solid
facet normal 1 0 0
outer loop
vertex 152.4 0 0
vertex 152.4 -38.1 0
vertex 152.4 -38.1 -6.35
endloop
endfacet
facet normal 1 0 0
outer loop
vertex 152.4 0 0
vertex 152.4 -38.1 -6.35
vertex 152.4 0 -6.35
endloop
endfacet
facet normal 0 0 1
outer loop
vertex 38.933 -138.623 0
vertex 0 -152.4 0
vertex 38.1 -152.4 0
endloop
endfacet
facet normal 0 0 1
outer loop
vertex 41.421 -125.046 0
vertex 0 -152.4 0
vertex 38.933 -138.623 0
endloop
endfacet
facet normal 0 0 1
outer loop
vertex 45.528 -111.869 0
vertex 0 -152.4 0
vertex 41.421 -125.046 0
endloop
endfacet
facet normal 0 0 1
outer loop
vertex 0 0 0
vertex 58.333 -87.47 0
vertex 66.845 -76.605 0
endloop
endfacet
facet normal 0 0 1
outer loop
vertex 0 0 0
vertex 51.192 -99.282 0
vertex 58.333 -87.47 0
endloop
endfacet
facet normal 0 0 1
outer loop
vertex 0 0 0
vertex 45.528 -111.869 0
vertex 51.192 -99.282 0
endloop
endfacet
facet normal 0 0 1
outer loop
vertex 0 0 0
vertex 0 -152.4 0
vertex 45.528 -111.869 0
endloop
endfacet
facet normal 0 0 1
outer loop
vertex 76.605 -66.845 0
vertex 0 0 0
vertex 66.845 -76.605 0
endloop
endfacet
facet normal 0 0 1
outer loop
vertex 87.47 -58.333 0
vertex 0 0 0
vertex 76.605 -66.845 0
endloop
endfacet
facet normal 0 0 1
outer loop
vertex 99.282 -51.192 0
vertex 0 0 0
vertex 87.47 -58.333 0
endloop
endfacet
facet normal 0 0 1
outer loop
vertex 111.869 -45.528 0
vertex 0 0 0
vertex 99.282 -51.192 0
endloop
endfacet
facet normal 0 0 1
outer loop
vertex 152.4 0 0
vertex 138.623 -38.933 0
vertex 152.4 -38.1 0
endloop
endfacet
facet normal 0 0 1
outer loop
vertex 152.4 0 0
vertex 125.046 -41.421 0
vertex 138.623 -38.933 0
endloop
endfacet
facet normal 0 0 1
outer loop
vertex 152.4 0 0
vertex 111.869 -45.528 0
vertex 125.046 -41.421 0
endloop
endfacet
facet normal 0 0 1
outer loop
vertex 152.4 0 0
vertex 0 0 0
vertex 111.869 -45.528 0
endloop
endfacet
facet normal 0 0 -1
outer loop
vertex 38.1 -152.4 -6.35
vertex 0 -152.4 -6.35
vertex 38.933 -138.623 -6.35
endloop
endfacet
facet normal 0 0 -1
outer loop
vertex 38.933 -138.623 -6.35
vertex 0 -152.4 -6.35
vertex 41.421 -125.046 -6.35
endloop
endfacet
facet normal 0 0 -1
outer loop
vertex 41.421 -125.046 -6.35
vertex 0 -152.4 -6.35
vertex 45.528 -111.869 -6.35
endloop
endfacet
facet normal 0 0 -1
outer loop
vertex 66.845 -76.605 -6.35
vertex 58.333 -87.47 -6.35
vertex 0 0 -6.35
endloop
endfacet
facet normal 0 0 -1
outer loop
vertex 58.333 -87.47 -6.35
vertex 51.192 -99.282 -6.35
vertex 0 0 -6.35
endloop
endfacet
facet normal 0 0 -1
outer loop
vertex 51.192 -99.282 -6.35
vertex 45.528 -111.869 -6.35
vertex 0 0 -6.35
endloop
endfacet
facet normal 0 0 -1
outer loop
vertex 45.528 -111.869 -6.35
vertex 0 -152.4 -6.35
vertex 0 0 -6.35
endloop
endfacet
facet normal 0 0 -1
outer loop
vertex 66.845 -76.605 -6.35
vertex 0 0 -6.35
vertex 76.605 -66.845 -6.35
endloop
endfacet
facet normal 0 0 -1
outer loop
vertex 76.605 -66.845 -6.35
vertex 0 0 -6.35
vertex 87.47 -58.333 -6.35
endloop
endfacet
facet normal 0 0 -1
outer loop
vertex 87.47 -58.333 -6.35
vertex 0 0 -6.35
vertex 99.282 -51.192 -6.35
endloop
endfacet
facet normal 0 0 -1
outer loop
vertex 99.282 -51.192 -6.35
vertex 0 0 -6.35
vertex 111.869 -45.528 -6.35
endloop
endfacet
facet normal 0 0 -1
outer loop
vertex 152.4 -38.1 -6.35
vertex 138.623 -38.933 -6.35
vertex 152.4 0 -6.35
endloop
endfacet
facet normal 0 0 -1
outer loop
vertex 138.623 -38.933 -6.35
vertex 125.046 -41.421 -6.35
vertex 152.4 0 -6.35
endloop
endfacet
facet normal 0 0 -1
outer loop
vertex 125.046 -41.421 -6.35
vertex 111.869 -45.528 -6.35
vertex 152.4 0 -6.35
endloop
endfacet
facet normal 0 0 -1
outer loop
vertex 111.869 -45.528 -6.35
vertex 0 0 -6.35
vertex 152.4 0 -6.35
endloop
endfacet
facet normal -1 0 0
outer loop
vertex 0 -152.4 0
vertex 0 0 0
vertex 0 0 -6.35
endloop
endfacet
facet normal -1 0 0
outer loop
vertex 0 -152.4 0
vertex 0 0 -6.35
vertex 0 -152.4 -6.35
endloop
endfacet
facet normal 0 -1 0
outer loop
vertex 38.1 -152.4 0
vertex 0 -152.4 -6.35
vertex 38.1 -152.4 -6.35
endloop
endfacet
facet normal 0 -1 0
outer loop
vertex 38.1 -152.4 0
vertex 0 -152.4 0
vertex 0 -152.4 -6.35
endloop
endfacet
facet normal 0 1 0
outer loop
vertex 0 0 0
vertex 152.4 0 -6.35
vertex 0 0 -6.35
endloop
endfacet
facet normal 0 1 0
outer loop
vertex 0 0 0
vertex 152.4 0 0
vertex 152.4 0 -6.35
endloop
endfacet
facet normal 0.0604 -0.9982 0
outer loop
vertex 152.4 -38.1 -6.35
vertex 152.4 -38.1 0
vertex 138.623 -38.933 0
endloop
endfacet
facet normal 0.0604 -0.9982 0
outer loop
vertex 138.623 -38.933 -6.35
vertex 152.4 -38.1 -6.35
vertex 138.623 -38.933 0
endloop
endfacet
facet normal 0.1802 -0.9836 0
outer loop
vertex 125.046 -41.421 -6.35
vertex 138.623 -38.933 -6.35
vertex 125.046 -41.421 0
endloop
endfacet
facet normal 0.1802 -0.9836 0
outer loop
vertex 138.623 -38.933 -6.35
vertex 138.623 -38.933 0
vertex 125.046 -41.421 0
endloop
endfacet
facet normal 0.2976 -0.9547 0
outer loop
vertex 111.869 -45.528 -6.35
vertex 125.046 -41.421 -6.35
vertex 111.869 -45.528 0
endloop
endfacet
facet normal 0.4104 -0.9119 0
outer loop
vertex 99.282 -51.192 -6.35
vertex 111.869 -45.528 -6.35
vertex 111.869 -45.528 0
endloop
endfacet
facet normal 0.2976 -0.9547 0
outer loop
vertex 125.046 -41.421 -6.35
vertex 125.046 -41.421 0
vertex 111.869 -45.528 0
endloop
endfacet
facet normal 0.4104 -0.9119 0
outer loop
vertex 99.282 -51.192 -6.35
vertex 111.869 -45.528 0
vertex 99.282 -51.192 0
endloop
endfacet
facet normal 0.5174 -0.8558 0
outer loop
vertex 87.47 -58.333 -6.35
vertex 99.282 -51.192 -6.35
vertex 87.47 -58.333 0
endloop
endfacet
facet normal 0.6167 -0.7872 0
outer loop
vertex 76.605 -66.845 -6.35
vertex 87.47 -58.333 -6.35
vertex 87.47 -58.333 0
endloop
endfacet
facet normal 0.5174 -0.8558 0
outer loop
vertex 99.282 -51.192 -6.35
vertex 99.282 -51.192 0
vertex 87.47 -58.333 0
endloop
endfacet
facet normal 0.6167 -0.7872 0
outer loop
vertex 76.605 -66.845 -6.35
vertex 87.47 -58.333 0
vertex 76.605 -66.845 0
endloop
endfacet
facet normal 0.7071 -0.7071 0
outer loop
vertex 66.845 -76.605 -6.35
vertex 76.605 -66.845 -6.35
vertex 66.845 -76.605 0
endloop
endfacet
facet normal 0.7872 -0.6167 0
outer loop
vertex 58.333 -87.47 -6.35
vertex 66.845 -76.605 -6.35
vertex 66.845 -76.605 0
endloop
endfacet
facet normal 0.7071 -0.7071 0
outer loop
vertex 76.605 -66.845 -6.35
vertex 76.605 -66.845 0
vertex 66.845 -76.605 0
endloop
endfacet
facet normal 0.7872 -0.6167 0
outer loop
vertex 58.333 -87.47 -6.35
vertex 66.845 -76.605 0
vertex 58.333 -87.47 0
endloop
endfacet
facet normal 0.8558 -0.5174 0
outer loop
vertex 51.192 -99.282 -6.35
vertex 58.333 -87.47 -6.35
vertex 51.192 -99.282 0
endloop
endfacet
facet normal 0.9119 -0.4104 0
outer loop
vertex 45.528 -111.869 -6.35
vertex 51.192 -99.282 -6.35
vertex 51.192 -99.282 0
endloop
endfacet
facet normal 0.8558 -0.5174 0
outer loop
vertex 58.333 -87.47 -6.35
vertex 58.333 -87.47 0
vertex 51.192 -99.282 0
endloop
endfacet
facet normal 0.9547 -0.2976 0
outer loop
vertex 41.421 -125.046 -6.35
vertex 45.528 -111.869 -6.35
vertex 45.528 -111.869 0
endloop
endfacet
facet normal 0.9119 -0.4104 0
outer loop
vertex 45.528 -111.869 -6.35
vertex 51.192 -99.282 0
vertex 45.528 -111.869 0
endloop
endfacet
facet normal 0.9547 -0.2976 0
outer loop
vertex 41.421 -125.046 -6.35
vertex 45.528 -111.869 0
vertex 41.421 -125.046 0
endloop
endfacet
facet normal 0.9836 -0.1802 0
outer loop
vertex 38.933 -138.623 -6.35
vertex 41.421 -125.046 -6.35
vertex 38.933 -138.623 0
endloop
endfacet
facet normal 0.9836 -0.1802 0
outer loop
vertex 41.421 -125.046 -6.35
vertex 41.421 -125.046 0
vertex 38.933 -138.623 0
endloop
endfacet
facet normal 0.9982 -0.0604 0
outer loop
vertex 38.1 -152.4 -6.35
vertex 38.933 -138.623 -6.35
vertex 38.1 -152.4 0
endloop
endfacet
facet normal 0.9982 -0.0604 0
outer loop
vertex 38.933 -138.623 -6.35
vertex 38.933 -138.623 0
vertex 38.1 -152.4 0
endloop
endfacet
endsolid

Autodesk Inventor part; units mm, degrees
ref_plane "YZ Plane" through (0, 0, 0) normal (1, 0, 0) x (0, 1, 0)
ref_plane "XZ Plane" through (0, 0, 0) normal (0, 1, 0) x (-1, 0, 0)
ref_plane "XY Plane" through (0, 0, 0) normal (0, 0, 1) x (1, 0, 0)
sketch "Sketch1" plane through (0, 0, 0) normal (0, 0, 1) x (1, 0, 0)
  line L0 (0, 0) -> (0, -152.4)
  line L1 (0, -152.4) -> (38.1, -152.4)
  arc A0 (152.4, -38.1) -> (38.1, -152.4) centre (152.4, -152.4) ccw
  line L2 (152.4, -38.1) -> (152.4, 0)
  line L3 (152.4, 0) -> (0, 0)
  dimension "d0" = 152.4
  dimension "d1" = 152.4
  dimension "d2" = 38.1
  dimension "d3" = 38.1
extrude "Extrusion1" add sketch "Sketch1" against normal blind 6.35
properties part number "support"
